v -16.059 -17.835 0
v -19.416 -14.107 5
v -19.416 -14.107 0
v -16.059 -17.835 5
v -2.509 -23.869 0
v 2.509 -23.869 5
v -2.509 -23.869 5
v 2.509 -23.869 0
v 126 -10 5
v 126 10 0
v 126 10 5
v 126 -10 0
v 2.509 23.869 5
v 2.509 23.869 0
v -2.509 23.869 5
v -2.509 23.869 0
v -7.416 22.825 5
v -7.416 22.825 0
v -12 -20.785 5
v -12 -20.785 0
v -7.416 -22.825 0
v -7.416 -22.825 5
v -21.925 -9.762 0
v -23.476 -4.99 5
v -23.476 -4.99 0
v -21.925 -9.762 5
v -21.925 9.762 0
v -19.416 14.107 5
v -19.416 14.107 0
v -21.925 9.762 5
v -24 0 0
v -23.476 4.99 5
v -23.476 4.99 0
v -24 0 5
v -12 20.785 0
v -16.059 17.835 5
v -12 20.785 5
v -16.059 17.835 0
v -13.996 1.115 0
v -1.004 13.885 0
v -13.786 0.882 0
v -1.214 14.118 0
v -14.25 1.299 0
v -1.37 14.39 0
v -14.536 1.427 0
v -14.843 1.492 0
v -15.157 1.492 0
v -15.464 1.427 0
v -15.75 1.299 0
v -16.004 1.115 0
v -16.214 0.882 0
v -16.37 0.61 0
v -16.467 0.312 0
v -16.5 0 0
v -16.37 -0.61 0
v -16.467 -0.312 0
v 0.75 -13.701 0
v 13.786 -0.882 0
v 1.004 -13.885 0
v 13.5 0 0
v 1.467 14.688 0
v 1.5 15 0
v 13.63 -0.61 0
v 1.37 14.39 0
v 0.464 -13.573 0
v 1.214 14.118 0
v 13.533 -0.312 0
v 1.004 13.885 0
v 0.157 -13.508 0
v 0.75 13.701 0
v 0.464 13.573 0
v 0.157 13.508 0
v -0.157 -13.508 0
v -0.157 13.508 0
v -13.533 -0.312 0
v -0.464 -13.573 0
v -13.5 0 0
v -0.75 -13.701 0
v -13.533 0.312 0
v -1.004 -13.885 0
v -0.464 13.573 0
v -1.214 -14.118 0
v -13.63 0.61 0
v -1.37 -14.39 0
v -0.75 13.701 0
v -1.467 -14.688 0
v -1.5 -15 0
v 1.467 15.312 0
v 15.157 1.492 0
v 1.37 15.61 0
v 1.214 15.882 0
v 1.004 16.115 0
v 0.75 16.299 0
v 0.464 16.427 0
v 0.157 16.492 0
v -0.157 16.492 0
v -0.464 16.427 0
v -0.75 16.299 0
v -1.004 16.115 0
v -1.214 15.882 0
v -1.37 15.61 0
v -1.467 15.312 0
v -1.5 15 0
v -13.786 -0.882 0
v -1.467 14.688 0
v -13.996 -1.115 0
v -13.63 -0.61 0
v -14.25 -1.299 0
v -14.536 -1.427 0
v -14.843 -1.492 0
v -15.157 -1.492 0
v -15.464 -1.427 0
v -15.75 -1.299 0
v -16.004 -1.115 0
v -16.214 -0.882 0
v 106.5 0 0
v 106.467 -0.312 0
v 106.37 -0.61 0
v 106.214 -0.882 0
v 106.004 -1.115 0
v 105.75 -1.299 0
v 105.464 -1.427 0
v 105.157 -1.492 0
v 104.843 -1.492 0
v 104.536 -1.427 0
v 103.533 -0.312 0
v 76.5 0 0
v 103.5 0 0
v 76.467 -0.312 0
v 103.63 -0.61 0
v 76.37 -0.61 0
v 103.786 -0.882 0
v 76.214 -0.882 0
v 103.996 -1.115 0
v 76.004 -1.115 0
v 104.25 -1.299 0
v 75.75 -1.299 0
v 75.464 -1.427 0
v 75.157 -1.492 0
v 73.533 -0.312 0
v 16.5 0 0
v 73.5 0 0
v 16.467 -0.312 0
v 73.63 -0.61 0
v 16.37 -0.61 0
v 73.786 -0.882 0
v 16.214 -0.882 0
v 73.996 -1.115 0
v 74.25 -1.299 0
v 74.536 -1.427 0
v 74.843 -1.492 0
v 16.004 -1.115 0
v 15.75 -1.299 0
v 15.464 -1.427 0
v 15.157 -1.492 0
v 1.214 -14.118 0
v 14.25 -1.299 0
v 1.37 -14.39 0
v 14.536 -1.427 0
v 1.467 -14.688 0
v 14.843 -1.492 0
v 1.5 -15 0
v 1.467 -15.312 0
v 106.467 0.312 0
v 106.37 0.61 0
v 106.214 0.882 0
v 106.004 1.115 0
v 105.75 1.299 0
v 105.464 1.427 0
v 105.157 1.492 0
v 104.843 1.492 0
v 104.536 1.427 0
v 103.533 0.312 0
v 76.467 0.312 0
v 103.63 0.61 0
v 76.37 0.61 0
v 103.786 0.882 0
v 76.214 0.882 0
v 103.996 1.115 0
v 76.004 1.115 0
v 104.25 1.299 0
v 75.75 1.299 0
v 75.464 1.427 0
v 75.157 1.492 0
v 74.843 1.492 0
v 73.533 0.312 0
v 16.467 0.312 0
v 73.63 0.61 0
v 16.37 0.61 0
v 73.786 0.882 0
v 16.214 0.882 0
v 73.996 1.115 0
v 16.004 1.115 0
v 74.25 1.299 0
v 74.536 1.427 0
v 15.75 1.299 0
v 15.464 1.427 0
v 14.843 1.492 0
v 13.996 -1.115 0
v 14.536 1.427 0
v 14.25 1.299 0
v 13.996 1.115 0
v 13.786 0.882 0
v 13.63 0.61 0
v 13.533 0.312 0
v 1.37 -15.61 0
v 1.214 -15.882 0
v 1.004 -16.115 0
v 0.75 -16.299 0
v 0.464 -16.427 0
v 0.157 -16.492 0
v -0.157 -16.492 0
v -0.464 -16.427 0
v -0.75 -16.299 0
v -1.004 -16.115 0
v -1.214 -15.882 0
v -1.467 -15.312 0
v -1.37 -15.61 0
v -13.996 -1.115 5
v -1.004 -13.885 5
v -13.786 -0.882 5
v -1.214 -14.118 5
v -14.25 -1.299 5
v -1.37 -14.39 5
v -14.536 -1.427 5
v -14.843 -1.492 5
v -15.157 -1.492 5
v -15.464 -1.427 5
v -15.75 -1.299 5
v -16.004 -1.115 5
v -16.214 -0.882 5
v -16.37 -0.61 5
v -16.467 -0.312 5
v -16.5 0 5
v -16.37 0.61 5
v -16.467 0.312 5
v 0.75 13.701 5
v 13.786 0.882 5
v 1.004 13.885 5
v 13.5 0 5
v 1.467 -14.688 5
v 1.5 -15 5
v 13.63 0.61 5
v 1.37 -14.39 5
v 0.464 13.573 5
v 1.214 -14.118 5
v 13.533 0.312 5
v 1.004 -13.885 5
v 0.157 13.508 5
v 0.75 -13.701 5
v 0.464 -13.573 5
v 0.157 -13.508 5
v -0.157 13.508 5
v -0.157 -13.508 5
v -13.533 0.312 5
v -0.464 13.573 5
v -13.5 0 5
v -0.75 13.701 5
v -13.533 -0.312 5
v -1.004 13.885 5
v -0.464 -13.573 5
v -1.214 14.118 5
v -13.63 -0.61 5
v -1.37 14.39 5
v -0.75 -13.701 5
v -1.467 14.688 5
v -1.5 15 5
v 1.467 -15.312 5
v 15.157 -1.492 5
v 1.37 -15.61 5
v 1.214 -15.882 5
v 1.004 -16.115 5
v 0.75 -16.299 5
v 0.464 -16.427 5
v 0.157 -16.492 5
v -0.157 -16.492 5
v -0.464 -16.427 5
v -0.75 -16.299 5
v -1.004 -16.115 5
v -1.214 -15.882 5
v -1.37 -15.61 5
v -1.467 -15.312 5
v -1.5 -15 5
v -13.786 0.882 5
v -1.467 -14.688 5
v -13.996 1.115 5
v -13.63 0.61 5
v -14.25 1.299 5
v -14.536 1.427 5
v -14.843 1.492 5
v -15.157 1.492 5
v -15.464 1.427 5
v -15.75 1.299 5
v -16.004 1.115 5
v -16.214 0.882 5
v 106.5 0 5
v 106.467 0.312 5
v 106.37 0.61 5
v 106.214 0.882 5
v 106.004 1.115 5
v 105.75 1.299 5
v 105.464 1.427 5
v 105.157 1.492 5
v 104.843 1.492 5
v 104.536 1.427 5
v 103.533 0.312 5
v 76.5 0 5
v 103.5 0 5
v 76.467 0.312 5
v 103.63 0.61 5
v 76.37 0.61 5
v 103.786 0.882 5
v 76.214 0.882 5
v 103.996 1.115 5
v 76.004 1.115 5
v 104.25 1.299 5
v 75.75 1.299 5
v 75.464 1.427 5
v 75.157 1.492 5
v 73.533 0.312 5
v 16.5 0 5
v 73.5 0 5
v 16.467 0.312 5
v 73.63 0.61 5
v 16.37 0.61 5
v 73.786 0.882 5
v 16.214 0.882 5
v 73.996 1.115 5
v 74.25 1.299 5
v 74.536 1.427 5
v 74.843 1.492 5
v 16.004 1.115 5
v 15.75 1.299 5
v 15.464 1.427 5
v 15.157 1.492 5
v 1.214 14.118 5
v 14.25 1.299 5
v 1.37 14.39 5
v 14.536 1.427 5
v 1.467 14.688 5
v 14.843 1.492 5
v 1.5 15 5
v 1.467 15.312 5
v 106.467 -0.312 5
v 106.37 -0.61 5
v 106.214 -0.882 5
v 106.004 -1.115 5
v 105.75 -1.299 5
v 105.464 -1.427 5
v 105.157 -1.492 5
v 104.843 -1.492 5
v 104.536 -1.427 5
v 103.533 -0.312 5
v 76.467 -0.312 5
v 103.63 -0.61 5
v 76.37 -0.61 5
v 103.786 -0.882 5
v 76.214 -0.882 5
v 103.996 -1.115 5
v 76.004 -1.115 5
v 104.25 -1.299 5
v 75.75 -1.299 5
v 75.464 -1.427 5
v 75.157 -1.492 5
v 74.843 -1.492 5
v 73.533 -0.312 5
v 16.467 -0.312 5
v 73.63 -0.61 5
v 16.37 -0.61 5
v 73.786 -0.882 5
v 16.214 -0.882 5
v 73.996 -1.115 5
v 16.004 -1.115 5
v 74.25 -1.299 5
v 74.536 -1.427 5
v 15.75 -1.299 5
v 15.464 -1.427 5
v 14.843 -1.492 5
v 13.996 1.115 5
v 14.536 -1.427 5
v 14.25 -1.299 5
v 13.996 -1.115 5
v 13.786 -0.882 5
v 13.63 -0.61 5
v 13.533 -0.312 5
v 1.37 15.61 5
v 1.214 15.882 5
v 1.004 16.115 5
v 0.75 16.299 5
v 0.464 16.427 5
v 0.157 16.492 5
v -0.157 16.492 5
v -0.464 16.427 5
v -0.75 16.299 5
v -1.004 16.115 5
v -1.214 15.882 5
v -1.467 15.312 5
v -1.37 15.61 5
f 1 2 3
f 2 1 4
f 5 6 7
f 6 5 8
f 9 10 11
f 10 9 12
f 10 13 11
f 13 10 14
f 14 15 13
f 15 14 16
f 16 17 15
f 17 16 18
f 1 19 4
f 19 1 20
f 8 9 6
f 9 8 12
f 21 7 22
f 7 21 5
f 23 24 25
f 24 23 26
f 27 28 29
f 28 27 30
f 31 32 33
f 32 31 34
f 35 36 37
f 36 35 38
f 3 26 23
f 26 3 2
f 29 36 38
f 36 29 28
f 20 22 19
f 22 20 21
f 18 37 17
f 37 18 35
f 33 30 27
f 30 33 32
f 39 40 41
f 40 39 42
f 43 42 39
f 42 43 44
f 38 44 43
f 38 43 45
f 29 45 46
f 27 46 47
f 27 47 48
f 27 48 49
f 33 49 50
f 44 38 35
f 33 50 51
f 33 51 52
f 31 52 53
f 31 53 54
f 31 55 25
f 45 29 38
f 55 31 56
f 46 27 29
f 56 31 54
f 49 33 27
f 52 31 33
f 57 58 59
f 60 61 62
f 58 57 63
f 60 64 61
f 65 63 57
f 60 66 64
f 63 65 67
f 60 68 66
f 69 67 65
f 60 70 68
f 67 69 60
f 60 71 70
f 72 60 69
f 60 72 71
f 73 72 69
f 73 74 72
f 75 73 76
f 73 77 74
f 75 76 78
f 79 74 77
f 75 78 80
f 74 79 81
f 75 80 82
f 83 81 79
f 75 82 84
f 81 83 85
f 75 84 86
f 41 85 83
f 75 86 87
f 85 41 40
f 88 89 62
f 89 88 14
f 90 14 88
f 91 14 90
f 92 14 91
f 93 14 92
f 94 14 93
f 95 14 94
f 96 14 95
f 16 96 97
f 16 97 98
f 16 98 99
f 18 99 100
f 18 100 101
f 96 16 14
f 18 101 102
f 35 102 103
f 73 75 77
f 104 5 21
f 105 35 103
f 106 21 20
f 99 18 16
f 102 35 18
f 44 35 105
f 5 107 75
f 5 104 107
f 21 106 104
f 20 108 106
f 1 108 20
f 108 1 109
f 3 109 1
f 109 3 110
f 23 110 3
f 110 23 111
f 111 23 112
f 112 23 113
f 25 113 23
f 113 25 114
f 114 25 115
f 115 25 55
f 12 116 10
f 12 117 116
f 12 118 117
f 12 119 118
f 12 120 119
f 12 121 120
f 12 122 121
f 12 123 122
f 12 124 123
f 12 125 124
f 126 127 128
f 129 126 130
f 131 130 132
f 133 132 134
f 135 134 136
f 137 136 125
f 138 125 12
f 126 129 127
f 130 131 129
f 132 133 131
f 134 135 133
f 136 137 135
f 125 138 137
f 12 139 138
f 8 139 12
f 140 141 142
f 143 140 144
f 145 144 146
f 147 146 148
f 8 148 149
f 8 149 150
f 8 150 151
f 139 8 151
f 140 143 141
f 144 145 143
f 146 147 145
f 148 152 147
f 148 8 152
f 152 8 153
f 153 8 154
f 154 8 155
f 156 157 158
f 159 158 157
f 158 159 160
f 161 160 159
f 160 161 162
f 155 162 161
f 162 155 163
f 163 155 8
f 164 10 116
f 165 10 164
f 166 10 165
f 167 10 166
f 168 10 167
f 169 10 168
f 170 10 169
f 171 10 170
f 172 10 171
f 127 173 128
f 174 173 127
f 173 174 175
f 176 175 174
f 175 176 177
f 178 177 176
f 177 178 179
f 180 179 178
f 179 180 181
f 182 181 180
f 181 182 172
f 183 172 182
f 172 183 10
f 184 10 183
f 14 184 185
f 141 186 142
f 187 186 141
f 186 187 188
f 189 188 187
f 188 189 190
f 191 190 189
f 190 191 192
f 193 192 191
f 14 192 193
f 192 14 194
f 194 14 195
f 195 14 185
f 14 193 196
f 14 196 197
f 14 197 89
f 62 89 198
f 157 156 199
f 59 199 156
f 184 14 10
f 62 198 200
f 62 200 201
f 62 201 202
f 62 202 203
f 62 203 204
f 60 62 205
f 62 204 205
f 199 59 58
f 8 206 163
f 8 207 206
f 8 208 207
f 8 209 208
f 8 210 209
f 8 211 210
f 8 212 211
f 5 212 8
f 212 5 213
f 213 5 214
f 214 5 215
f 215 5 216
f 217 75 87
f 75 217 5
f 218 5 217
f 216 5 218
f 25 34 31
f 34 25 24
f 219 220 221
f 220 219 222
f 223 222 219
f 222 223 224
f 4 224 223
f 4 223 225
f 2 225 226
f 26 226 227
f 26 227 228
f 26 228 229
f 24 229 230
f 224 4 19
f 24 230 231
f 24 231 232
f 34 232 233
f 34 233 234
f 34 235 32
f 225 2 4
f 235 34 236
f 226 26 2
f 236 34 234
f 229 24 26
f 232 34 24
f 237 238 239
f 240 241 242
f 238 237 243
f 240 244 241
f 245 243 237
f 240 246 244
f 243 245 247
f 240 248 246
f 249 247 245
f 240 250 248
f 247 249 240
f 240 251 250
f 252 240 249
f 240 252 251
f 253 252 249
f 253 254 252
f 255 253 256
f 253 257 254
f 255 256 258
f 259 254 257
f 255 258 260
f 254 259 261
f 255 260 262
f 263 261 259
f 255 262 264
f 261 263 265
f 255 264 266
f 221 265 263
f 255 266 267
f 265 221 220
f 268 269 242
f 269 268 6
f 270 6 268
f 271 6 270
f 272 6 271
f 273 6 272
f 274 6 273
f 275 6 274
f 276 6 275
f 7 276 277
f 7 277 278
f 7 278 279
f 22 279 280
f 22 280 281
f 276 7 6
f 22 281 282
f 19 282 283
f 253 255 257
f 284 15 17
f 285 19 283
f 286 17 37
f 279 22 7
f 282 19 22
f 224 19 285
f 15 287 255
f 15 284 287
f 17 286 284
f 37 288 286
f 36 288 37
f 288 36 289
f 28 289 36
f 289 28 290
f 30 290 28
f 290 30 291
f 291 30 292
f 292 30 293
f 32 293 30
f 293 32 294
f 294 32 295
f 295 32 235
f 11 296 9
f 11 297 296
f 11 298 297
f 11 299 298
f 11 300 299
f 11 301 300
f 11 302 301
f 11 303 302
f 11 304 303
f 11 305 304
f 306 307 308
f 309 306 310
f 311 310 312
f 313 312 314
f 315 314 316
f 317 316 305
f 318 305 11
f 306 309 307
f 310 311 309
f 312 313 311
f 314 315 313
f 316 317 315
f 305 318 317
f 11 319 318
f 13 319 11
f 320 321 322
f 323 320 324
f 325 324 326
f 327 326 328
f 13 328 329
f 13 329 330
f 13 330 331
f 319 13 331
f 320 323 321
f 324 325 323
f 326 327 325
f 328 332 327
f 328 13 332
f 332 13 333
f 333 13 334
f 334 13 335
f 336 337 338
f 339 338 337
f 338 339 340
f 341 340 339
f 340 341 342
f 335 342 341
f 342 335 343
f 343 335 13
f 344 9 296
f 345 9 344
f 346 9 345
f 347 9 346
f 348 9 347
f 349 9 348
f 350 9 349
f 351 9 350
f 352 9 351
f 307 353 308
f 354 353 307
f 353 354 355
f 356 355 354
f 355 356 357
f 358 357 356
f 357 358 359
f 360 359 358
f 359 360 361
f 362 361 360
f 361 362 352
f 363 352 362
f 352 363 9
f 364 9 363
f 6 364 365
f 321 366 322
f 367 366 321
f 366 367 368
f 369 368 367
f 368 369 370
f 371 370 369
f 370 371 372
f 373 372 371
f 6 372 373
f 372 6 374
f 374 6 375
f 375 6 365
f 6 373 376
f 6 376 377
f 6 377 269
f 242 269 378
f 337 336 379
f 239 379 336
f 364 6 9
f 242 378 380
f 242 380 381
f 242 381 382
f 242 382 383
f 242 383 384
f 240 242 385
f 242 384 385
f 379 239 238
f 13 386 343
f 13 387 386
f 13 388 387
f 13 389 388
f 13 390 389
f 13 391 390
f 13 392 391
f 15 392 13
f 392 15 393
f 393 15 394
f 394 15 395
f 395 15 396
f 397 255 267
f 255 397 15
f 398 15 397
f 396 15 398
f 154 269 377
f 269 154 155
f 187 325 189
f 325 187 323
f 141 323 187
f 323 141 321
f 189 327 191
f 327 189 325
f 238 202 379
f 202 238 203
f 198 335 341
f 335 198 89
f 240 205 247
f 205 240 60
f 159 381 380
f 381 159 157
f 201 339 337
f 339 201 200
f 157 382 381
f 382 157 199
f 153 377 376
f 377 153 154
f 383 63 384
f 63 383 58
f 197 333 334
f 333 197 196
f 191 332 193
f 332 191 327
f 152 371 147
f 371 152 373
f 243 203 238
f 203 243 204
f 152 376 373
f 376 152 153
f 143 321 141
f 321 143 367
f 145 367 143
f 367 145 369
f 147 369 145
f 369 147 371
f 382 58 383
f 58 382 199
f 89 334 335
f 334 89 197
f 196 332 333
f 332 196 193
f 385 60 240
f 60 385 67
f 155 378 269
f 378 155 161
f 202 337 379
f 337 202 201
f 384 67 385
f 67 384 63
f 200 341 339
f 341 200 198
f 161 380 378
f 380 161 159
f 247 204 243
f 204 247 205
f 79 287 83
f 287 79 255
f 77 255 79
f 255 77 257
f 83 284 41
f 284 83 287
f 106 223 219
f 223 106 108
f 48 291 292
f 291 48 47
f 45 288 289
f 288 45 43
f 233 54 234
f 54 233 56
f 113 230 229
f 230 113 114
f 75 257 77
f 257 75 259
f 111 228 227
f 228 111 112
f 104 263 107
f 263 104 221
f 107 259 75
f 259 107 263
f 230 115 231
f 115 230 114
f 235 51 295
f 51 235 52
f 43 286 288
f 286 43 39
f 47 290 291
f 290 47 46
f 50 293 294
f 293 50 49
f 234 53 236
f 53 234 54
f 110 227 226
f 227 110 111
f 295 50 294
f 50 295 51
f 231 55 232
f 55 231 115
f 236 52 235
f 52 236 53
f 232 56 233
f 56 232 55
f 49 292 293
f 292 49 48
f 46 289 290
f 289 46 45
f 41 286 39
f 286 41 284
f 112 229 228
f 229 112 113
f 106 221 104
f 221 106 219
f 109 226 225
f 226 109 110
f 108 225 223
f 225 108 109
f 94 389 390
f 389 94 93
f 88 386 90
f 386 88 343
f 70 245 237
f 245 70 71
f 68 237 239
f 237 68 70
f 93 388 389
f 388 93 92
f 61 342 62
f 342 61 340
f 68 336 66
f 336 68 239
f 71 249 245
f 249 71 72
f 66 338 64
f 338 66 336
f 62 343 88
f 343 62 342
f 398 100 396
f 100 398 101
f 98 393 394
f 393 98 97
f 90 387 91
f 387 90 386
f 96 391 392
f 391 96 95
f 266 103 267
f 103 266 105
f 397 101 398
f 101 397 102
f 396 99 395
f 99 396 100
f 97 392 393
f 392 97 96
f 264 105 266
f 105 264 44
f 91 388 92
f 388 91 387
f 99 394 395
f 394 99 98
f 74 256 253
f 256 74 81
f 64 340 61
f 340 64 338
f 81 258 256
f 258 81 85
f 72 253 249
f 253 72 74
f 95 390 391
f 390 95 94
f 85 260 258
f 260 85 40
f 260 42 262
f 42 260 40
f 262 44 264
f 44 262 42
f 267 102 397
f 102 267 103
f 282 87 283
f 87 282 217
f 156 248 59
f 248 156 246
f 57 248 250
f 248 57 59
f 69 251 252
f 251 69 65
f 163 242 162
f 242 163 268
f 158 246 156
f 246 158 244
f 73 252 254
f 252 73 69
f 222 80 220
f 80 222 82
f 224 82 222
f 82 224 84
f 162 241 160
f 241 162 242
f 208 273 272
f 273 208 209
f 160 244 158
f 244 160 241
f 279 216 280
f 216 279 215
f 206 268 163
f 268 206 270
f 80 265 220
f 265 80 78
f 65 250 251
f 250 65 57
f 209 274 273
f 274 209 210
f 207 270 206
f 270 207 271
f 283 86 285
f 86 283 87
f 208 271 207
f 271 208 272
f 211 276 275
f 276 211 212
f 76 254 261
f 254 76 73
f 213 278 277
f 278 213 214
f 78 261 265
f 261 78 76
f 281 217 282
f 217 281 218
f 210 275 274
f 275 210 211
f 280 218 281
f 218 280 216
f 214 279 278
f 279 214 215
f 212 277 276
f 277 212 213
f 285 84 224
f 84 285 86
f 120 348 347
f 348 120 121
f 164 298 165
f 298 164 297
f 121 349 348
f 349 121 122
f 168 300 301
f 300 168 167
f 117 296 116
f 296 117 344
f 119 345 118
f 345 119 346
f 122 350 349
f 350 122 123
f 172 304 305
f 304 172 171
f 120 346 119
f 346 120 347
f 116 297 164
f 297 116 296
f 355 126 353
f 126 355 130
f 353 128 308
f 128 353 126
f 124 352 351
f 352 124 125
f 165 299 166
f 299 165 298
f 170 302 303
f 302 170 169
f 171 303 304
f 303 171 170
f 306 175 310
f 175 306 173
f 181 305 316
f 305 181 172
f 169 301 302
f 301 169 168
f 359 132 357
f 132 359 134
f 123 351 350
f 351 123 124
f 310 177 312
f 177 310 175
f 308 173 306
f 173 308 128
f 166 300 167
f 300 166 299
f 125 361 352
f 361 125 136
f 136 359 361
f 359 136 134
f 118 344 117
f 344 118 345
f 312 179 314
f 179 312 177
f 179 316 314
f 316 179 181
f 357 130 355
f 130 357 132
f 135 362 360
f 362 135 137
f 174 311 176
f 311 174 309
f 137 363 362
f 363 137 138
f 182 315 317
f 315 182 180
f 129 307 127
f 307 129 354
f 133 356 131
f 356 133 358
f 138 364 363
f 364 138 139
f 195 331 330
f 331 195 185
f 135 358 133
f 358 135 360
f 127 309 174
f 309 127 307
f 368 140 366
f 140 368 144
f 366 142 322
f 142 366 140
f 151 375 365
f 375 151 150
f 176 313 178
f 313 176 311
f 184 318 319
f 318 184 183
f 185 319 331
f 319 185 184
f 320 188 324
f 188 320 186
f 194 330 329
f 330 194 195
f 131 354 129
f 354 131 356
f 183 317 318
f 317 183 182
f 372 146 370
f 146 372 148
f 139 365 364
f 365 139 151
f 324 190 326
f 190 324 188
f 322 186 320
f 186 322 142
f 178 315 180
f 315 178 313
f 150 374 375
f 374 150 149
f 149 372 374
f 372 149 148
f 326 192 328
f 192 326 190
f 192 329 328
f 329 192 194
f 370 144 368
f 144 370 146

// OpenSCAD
$fn=30;

difference(){
    hull(){
        cylinder(r=24, h=5);
        translate([125, -20/2, 0]) cube([1, 20, 5]);
    }
    translate([15, 0, -0.1]) cylinder(d=3, h=1000);
    translate([-15, 0, -0.1]) cylinder(d=3, h=1000);
    translate([0, 15, -0.1]) cylinder(d=3, h=1000);
    translate([0, -15, -0.1]) cylinder(d=3, h=1000);
    
    translate([125-20, 0, -0.1]) cylinder(d=3, h=1000);
    translate([125-50, 0, -0.1]) cylinder(d=3, h=1000);
    
    
}

if(0)
difference(){
    hull(){
        cylinder(r=23, h=5);
        translate([120, -20, 0]) cube([20, 40, 10]);
    }
    translate([15, 0, -0.1]) cylinder(d=3, h=1000);
    translate([-15, 0, -0.1]) cylinder(d=3, h=1000);
    translate([0, 15, -0.1]) cylinder(d=3, h=1000);
    translate([0, -15, -0.1]) cylinder(d=3, h=1000);
    
    // screw
    translate([110, 0, 5]) rotate([0, 90, 0]) cylinder(d=3, h=33);
    
    // mutteri
    translate([110, -6, -0.1]) cube([7, 12, 20]);
    
}
